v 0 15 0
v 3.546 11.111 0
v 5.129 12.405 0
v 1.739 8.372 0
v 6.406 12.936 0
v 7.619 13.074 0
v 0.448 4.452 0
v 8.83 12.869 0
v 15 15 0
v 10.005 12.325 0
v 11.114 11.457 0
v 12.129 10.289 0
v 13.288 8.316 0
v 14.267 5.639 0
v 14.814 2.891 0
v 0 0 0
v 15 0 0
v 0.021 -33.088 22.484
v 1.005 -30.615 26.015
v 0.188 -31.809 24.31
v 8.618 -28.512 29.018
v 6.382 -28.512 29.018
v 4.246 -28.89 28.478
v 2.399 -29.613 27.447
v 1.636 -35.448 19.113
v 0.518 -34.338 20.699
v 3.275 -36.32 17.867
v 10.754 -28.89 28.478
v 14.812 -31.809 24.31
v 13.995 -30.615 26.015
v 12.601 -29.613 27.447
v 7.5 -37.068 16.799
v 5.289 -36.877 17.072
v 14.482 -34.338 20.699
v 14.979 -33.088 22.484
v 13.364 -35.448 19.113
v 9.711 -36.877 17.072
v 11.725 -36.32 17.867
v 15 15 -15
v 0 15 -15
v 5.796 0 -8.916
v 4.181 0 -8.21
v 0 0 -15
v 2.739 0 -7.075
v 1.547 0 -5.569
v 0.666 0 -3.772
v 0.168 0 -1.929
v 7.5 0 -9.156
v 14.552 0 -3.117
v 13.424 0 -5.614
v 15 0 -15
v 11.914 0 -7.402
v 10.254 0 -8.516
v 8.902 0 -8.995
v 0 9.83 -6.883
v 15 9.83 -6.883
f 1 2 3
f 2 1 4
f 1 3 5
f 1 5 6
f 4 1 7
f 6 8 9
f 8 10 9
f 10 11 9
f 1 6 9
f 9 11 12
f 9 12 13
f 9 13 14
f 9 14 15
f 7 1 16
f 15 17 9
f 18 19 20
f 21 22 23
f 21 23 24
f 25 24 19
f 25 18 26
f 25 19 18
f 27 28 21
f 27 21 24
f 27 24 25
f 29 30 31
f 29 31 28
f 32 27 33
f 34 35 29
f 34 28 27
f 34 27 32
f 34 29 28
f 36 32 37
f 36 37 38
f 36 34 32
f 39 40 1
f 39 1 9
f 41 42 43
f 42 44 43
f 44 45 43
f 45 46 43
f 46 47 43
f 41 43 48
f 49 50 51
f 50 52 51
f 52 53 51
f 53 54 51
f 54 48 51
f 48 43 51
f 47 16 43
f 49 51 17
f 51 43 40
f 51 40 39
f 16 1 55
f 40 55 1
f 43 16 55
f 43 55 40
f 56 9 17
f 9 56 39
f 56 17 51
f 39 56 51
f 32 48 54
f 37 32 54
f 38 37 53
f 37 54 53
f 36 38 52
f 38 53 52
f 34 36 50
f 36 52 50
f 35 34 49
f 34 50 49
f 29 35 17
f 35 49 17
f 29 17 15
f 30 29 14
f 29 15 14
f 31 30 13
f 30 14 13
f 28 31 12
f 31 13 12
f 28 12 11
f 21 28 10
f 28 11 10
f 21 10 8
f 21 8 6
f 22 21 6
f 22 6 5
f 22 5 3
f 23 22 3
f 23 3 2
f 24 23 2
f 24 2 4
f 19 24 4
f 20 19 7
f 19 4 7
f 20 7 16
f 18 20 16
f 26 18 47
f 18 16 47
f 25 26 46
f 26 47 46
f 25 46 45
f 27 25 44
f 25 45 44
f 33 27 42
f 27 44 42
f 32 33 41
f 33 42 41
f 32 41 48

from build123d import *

# Parameters (mm, degrees)
SKETCH1_W                = 15
SKETCH1_H                = 15
BOSS_EXTRUDE1_DEPTH      = 15
BOSS_EXTRUDE2_DEPTH      = 40
BOSS_EXTRUDE2_DEPTH_BACK = 12
SKETCH2_R                = 7.5


with BuildPart() as part:
    # Sketch1 → Boss-Extrude1 (new body)
    with BuildSketch(Plane(origin=(0, 0, 0), x_dir=(1, 0, 0), z_dir=(0, 1, 0))):
        with Locations((7.5, 7.5)):
            Rectangle(SKETCH1_W, SKETCH1_H)
    extrude(amount=BOSS_EXTRUDE1_DEPTH)

    # Sketch2 → Boss-Extrude2 (add, two sides: drawn at the far end of the back side and taken through both)
    with BuildSketch(Plane(origin=(0, 0, 0), x_dir=(1, 0, 0), z_dir=(0, -0.8191520442889992, 0.5735764363510355)).offset(-BOSS_EXTRUDE2_DEPTH_BACK)):
        with Locations(Location((7.5, 0, 0), (0, 0, 270))):
            Circle(SKETCH2_R)
    extrude(amount=BOSS_EXTRUDE2_DEPTH + BOSS_EXTRUDE2_DEPTH_BACK)


solid = part.part
